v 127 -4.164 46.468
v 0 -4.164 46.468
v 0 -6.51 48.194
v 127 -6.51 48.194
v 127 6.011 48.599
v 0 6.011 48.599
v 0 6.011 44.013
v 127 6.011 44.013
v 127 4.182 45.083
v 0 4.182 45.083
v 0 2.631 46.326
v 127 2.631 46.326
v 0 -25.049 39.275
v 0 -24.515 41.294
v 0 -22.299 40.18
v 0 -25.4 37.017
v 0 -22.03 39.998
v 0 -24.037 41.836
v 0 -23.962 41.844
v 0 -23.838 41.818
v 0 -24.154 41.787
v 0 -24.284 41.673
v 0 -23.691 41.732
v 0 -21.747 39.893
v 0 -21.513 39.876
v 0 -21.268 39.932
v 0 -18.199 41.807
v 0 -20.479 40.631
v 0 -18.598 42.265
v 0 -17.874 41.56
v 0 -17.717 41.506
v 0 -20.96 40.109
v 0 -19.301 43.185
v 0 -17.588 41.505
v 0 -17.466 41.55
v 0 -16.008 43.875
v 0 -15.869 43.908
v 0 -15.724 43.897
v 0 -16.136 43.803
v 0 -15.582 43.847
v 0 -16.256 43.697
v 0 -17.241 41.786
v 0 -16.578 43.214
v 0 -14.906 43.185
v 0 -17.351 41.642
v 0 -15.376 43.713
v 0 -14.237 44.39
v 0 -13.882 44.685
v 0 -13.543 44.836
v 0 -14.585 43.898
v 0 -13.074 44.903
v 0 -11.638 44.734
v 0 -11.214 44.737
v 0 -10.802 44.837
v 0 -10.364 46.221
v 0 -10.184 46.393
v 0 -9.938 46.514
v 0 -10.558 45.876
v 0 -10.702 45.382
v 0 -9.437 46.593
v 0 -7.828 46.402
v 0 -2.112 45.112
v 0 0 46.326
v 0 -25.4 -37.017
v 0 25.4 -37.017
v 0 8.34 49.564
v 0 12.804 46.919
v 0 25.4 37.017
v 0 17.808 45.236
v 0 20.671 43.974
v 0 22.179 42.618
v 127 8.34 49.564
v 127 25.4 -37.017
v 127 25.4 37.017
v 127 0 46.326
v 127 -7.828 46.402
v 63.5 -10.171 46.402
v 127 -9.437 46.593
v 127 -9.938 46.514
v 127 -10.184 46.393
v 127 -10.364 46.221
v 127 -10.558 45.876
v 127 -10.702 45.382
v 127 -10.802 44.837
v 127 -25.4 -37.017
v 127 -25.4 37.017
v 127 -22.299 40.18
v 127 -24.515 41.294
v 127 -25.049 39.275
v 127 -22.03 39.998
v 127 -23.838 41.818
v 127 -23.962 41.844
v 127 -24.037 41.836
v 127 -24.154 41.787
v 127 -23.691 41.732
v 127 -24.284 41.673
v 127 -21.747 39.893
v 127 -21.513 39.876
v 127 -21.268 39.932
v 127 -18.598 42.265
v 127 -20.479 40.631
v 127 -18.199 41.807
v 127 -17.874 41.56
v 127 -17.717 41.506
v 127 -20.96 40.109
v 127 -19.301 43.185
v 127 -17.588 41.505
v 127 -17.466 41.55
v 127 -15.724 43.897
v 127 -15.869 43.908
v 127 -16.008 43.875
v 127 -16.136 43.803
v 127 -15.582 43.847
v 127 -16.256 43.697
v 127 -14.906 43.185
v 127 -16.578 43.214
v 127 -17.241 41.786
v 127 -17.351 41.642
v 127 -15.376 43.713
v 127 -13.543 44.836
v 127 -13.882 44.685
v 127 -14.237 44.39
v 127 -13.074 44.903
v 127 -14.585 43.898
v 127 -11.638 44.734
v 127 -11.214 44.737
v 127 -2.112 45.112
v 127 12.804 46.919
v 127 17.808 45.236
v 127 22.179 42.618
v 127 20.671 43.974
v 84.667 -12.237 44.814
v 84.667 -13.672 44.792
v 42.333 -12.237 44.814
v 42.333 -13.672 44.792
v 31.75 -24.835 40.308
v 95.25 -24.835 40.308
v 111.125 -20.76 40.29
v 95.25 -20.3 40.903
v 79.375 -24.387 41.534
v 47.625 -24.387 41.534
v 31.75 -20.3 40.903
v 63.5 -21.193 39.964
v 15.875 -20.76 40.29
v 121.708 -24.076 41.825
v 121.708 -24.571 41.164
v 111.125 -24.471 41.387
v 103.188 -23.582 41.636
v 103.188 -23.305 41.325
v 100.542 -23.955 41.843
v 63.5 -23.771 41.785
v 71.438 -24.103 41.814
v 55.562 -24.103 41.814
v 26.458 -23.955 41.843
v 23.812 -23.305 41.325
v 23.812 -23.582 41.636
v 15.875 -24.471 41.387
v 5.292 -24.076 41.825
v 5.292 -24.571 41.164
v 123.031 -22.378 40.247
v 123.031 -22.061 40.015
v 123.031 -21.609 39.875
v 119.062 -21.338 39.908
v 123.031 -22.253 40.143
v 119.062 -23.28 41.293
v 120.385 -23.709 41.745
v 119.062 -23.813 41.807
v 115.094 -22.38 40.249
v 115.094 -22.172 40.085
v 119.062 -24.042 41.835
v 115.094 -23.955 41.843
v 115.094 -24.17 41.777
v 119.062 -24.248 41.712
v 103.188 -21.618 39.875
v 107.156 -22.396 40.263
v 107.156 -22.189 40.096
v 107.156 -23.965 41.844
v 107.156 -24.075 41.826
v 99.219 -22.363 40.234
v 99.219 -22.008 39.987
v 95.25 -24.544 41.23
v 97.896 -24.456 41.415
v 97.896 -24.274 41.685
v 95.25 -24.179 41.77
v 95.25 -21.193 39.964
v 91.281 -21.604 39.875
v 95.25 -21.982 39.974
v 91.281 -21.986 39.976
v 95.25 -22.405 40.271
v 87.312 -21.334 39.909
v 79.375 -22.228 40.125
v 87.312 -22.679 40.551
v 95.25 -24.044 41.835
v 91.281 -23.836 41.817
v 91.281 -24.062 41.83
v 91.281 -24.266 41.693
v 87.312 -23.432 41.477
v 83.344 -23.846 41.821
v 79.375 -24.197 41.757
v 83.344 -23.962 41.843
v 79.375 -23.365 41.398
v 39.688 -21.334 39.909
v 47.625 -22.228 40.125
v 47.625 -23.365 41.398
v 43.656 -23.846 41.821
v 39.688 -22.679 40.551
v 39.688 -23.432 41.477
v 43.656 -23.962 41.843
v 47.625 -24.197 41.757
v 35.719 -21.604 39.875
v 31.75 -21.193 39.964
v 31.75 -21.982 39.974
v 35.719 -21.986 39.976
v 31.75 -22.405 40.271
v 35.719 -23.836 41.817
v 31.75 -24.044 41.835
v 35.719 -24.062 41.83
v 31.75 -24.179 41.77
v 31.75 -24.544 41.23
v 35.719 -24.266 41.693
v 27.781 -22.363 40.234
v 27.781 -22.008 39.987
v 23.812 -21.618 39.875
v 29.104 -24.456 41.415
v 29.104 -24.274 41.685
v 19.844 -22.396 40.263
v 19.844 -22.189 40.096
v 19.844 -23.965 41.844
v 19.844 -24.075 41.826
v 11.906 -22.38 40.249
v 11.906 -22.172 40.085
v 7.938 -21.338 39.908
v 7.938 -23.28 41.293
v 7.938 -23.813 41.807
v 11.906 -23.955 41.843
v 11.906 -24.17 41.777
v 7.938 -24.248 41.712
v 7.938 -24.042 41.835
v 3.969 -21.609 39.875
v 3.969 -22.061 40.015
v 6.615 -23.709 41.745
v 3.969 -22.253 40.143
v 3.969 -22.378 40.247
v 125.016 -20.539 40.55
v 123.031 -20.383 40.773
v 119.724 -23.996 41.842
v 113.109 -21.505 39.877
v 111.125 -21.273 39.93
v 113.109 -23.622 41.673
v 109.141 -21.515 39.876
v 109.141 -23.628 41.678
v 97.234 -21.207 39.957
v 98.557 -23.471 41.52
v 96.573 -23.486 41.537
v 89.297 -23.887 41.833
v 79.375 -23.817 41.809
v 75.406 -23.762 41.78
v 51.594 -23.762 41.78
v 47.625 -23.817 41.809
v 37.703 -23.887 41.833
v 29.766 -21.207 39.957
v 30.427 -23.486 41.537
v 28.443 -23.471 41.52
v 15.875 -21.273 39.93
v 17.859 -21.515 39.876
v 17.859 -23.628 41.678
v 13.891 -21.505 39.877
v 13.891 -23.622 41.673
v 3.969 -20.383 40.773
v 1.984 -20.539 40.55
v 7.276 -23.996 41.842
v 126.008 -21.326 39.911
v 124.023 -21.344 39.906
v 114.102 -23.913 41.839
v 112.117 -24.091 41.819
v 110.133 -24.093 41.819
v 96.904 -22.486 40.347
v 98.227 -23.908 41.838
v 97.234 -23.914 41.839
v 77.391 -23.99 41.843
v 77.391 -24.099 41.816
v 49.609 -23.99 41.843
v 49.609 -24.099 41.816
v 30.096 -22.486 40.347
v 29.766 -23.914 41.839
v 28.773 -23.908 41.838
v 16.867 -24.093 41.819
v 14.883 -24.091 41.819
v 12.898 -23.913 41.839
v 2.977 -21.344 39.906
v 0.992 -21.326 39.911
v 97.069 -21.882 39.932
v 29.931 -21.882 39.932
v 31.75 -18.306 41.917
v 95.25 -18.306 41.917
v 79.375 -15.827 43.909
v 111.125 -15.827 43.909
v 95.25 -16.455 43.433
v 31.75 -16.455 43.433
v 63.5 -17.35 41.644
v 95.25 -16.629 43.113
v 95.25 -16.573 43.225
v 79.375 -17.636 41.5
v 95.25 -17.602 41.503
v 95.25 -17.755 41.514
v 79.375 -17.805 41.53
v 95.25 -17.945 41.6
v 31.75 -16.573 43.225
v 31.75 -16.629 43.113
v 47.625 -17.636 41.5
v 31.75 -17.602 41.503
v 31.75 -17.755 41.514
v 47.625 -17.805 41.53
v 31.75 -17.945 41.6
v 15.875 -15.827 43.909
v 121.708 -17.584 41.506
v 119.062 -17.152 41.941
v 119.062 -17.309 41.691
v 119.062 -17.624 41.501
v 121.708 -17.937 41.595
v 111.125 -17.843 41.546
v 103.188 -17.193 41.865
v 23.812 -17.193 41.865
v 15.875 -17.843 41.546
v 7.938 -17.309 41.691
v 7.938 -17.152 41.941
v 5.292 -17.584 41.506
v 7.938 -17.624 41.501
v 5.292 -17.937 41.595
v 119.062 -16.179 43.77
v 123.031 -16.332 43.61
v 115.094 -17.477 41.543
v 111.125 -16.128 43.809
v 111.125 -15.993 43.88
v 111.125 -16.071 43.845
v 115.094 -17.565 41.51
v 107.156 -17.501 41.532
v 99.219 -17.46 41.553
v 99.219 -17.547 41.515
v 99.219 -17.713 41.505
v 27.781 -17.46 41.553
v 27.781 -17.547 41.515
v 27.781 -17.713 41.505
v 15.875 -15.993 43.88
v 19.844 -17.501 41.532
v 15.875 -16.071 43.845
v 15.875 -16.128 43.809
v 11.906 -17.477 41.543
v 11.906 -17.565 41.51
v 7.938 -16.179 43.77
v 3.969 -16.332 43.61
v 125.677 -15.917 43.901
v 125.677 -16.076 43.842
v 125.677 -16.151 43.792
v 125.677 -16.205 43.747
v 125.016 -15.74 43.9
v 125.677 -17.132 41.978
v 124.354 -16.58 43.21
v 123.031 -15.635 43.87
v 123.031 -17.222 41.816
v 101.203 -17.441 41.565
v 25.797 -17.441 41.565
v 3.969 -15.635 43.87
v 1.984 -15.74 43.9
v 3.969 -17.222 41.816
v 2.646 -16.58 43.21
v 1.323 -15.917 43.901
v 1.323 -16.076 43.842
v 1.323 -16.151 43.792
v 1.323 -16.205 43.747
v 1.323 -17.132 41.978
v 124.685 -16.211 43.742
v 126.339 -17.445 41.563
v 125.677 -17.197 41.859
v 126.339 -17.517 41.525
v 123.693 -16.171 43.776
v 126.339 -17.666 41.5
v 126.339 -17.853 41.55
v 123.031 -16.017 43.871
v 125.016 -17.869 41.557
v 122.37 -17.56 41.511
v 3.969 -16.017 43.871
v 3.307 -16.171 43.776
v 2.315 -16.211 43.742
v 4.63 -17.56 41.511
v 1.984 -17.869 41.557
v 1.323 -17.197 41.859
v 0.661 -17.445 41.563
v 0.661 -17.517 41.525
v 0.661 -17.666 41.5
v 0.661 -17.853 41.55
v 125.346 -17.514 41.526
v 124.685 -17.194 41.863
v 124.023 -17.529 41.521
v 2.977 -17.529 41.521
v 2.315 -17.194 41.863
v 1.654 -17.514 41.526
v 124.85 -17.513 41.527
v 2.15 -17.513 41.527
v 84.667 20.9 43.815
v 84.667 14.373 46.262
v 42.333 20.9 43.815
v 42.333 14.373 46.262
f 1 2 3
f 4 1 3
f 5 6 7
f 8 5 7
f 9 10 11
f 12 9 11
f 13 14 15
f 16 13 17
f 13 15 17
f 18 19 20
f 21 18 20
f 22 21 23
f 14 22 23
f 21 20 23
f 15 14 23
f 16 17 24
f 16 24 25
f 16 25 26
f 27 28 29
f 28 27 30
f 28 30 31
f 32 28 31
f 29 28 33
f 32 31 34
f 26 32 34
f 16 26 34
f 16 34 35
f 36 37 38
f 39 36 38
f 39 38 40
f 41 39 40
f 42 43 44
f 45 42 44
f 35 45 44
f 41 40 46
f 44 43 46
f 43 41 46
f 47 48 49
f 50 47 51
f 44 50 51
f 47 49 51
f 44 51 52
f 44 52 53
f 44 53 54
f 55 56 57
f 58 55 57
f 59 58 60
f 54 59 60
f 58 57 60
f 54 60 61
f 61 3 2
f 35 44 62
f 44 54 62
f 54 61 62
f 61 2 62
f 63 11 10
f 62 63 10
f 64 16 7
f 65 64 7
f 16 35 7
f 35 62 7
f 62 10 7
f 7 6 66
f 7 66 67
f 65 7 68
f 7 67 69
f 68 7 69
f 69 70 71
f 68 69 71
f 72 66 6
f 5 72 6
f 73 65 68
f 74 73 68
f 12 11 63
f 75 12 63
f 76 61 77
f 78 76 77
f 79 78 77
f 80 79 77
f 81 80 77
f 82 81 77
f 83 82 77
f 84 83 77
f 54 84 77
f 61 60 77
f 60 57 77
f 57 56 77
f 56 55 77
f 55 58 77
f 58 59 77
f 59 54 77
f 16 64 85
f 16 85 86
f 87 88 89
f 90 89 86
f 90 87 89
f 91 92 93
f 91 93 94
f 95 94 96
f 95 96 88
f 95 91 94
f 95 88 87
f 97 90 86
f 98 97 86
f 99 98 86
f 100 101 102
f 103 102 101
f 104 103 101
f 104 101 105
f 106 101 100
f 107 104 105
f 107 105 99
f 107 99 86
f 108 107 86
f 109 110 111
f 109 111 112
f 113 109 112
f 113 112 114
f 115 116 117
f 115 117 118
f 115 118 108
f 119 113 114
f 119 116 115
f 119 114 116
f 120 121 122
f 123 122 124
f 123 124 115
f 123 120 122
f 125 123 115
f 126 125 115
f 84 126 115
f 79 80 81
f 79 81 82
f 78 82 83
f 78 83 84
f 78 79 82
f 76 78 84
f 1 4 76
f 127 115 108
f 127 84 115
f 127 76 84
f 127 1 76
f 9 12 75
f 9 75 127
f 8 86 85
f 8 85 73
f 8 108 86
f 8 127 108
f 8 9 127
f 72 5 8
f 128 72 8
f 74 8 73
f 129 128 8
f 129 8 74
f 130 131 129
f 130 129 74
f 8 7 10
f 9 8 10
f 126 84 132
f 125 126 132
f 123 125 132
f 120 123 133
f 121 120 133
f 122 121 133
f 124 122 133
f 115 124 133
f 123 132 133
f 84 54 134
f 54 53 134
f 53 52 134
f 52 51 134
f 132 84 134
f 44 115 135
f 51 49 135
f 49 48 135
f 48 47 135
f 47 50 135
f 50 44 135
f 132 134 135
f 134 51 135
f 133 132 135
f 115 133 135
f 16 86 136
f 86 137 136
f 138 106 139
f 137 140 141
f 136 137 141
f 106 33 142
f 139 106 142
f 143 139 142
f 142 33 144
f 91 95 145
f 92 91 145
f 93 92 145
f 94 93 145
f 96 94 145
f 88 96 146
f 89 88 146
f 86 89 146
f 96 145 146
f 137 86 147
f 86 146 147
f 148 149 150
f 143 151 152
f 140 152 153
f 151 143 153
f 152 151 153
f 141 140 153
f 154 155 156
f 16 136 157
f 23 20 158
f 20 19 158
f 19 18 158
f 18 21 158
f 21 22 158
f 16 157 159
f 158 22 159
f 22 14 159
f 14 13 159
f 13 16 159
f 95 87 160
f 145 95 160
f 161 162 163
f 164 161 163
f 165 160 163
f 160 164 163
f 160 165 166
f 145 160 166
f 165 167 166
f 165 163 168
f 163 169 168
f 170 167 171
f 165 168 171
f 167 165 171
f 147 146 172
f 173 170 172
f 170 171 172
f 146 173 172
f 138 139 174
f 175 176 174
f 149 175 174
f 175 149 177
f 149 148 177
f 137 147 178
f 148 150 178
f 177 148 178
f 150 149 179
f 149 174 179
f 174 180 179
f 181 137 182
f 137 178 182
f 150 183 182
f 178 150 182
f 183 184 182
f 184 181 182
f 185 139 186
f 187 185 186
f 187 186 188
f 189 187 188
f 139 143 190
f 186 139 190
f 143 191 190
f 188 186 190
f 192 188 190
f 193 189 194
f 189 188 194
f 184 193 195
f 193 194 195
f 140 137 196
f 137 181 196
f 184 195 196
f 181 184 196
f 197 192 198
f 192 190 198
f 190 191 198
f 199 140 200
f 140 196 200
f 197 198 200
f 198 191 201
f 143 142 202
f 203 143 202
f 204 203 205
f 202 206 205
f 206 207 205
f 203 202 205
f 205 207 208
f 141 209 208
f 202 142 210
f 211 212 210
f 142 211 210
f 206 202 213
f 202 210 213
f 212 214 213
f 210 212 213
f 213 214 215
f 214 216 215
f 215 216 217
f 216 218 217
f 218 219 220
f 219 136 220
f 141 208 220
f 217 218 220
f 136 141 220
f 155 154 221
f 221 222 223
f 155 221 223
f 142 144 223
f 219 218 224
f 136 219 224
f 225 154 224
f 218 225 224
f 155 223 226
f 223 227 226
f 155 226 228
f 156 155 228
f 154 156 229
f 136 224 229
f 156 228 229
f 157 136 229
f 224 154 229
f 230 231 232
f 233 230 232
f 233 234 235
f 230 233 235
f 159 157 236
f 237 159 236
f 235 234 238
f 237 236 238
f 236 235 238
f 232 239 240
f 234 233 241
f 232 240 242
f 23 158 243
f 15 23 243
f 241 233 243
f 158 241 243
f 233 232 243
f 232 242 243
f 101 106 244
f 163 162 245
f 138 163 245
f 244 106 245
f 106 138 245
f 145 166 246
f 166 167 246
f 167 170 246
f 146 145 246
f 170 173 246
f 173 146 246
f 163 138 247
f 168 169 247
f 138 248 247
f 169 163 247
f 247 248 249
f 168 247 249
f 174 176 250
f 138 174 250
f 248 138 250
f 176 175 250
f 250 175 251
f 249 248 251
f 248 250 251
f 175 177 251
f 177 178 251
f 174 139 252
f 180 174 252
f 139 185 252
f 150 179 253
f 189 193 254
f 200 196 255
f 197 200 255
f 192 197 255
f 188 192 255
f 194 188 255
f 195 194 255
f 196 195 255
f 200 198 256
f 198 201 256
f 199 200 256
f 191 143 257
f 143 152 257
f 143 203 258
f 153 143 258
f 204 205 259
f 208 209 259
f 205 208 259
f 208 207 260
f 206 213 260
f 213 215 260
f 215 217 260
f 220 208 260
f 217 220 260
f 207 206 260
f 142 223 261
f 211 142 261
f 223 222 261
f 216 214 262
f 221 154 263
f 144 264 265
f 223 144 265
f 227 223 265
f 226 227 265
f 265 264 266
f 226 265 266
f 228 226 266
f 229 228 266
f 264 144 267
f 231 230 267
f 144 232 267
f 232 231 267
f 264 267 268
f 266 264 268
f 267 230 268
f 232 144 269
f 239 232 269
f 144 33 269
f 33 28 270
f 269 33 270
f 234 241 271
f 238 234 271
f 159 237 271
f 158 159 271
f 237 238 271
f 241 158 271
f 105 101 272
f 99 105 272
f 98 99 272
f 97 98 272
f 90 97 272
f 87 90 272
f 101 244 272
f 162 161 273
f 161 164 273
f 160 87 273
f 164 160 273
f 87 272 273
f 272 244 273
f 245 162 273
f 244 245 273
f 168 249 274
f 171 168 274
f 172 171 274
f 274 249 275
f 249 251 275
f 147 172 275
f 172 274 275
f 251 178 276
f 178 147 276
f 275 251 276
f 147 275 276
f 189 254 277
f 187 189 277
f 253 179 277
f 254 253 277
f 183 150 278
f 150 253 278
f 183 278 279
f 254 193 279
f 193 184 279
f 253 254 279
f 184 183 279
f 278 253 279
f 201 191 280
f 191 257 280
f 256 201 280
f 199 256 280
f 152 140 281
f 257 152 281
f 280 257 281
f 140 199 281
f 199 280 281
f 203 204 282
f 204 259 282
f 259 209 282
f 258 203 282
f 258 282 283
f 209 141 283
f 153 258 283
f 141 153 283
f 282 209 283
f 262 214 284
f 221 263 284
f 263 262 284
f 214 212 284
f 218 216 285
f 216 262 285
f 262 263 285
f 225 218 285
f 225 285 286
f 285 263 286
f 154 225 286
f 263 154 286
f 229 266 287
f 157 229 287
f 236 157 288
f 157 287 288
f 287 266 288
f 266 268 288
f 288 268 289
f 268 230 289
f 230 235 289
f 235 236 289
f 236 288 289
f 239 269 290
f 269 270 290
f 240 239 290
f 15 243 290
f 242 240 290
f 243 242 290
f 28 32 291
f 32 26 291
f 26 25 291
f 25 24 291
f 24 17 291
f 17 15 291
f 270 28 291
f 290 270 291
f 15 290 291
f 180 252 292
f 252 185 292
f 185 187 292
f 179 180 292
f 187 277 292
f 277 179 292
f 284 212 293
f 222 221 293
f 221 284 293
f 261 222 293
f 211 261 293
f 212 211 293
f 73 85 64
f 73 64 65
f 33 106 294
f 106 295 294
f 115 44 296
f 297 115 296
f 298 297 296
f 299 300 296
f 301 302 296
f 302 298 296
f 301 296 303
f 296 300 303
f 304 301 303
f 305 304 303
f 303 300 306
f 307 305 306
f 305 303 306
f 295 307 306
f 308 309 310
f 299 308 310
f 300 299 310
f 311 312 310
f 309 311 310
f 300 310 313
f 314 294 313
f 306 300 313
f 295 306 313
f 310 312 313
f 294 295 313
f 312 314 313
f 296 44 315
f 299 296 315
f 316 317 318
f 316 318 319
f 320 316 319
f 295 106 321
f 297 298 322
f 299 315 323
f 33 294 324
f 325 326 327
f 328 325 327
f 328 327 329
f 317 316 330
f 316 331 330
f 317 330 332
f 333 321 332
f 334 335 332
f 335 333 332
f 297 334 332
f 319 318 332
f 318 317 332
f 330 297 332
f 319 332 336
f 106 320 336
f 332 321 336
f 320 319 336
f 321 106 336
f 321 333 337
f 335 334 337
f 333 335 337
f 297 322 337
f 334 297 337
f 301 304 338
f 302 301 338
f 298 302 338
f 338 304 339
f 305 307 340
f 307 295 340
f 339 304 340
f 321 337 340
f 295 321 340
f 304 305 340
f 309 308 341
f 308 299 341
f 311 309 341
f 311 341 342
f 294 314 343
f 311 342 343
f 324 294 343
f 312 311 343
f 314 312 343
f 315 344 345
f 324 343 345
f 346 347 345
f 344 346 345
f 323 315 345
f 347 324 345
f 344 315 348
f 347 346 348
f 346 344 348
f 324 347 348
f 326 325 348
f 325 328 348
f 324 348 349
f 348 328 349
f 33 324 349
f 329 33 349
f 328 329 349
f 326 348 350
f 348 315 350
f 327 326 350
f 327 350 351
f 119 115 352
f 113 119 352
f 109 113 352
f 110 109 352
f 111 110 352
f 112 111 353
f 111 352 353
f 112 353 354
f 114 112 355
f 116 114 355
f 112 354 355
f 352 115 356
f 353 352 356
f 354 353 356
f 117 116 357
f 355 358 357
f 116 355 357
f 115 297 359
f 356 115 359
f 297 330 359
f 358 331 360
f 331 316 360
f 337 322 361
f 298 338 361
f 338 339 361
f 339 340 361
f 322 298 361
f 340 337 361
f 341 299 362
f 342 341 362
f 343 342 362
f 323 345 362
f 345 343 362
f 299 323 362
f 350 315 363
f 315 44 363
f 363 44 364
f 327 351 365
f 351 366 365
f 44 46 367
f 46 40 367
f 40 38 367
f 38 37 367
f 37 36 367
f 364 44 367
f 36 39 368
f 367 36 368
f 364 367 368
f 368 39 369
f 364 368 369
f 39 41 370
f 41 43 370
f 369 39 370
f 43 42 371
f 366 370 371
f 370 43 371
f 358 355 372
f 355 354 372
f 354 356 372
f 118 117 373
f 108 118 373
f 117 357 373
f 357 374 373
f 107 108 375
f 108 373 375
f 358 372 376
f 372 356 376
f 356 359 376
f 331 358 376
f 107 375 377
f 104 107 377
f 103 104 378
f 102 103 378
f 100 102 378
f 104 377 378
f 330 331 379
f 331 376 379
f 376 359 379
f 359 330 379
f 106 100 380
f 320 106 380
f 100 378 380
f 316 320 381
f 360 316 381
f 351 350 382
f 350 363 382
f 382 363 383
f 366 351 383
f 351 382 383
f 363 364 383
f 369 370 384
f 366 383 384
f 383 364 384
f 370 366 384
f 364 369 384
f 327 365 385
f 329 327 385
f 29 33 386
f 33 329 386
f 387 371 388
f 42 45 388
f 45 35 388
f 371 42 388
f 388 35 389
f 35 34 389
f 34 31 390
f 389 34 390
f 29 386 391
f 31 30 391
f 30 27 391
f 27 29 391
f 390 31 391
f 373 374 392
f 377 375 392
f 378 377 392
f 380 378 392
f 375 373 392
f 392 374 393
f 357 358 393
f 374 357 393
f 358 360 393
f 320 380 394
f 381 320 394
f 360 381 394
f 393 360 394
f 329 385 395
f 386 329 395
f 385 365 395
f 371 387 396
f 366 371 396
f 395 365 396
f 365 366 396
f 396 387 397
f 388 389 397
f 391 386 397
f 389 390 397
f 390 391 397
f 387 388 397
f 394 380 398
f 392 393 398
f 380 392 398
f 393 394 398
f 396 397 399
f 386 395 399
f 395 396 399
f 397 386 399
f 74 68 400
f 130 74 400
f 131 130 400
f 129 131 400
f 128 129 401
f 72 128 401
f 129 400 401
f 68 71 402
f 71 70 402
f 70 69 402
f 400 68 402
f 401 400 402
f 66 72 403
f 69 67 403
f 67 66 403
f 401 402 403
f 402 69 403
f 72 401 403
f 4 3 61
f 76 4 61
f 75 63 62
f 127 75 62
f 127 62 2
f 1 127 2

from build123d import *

# Parameters (mm, degrees)
F0_W     = 50.8
F0_H     = 74.0344213812
F1_DEPTH = 127


with BuildPart() as f1:
    # F0 (on Right) → F1 (new body)
    with BuildSketch(Plane.YZ):
        Rectangle(F0_W, F0_H)
        with BuildLine():
            add(Edge.make_bspline(
                [(-19.3013066672, 43.1850821753), (-21.4090093279, 37.0172106906), (-24.3494860832, 45.6546692341), (-25.1121798288, 38.8879577986), (-25.4, 37.0172106906)],
                knots=[0, 0, 0, 0, 0.4908734324, 1, 1, 1, 1], degree=3))
            Line((-25.4, 37.0172106906), (25.4, 37.0172106906))
            add(Edge.make_bspline(
                [(25.4, 37.0172106906), (24.1469761984, 39.6873465113), (21.7352660584, 44.826589891), (14.1168536342, 45.7798795442), (10.2612386056, 48.3056625144), (8.3399138743, 49.5643096612)],
                knots=[0, 0, 0, 0, 0.3517130955, 0.6769465126, 1, 1, 1, 1], degree=3))
            Line((8.3399138743, 49.5643096612), (6.0114039641, 48.5994553662))
            Line((6.0114039641, 48.5994553662), (6.0114039641, 44.0129793506))
            Line((6.0114039641, 44.0129793506), (4.1820400831, 45.0826937511))
            Line((4.1820400831, 45.0826937511), (2.6306878551, 46.3257443578))
            Line((2.6306878551, 46.3257443578), (0, 46.3257443578))
            Line((0, 46.3257443578), (-2.1122993728, 45.1120589437))
            Line((-2.1122993728, 45.1120589437), (-4.1638919483, 46.4675385911))
            Line((-4.1638919483, 46.4675385911), (-6.5098943509, 48.1936162641))
            Line((-6.5098943509, 48.1936162641), (-7.8279942041, 46.4021178449))
            add(Edge.make_bspline(
                [(-7.8279942041, 46.4021178449), (-8.7529842011, 46.5683367476), (-10.4630172673, 46.8756269086), (-10.6953405167, 45.4786521496), (-10.8019958113, 44.8373293562)],
                knots=[0, 0, 0, 0, 0.5409193814, 1, 1, 1, 1], degree=3))
            add(Edge.make_bspline(
                [(-10.8019958113, 44.8373293562), (-12.170026328, 44.2865802372), (-13.8384892691, 46.1113293065), (-14.9060873555, 43.1850821753)],
                knots=[0, 0, 0, 0, 4.4241935027, 4.4241935027, 4.4241935027, 4.4241935027], degree=3))
            add(Edge.make_bspline(
                [(-14.9060873555, 43.1850821753), (-16.3850719337, 45.2574046367), (-17.0769340129, 39.5307223475), (-18.6861609787, 42.4541546369), (-19.3013066672, 43.1850821753)],
                knots=[0, 0, 0, 0, 0.5187324743, 1, 1, 1, 1], degree=3))
        make_face()
    extrude(amount=F1_DEPTH)


solid = f1.part
